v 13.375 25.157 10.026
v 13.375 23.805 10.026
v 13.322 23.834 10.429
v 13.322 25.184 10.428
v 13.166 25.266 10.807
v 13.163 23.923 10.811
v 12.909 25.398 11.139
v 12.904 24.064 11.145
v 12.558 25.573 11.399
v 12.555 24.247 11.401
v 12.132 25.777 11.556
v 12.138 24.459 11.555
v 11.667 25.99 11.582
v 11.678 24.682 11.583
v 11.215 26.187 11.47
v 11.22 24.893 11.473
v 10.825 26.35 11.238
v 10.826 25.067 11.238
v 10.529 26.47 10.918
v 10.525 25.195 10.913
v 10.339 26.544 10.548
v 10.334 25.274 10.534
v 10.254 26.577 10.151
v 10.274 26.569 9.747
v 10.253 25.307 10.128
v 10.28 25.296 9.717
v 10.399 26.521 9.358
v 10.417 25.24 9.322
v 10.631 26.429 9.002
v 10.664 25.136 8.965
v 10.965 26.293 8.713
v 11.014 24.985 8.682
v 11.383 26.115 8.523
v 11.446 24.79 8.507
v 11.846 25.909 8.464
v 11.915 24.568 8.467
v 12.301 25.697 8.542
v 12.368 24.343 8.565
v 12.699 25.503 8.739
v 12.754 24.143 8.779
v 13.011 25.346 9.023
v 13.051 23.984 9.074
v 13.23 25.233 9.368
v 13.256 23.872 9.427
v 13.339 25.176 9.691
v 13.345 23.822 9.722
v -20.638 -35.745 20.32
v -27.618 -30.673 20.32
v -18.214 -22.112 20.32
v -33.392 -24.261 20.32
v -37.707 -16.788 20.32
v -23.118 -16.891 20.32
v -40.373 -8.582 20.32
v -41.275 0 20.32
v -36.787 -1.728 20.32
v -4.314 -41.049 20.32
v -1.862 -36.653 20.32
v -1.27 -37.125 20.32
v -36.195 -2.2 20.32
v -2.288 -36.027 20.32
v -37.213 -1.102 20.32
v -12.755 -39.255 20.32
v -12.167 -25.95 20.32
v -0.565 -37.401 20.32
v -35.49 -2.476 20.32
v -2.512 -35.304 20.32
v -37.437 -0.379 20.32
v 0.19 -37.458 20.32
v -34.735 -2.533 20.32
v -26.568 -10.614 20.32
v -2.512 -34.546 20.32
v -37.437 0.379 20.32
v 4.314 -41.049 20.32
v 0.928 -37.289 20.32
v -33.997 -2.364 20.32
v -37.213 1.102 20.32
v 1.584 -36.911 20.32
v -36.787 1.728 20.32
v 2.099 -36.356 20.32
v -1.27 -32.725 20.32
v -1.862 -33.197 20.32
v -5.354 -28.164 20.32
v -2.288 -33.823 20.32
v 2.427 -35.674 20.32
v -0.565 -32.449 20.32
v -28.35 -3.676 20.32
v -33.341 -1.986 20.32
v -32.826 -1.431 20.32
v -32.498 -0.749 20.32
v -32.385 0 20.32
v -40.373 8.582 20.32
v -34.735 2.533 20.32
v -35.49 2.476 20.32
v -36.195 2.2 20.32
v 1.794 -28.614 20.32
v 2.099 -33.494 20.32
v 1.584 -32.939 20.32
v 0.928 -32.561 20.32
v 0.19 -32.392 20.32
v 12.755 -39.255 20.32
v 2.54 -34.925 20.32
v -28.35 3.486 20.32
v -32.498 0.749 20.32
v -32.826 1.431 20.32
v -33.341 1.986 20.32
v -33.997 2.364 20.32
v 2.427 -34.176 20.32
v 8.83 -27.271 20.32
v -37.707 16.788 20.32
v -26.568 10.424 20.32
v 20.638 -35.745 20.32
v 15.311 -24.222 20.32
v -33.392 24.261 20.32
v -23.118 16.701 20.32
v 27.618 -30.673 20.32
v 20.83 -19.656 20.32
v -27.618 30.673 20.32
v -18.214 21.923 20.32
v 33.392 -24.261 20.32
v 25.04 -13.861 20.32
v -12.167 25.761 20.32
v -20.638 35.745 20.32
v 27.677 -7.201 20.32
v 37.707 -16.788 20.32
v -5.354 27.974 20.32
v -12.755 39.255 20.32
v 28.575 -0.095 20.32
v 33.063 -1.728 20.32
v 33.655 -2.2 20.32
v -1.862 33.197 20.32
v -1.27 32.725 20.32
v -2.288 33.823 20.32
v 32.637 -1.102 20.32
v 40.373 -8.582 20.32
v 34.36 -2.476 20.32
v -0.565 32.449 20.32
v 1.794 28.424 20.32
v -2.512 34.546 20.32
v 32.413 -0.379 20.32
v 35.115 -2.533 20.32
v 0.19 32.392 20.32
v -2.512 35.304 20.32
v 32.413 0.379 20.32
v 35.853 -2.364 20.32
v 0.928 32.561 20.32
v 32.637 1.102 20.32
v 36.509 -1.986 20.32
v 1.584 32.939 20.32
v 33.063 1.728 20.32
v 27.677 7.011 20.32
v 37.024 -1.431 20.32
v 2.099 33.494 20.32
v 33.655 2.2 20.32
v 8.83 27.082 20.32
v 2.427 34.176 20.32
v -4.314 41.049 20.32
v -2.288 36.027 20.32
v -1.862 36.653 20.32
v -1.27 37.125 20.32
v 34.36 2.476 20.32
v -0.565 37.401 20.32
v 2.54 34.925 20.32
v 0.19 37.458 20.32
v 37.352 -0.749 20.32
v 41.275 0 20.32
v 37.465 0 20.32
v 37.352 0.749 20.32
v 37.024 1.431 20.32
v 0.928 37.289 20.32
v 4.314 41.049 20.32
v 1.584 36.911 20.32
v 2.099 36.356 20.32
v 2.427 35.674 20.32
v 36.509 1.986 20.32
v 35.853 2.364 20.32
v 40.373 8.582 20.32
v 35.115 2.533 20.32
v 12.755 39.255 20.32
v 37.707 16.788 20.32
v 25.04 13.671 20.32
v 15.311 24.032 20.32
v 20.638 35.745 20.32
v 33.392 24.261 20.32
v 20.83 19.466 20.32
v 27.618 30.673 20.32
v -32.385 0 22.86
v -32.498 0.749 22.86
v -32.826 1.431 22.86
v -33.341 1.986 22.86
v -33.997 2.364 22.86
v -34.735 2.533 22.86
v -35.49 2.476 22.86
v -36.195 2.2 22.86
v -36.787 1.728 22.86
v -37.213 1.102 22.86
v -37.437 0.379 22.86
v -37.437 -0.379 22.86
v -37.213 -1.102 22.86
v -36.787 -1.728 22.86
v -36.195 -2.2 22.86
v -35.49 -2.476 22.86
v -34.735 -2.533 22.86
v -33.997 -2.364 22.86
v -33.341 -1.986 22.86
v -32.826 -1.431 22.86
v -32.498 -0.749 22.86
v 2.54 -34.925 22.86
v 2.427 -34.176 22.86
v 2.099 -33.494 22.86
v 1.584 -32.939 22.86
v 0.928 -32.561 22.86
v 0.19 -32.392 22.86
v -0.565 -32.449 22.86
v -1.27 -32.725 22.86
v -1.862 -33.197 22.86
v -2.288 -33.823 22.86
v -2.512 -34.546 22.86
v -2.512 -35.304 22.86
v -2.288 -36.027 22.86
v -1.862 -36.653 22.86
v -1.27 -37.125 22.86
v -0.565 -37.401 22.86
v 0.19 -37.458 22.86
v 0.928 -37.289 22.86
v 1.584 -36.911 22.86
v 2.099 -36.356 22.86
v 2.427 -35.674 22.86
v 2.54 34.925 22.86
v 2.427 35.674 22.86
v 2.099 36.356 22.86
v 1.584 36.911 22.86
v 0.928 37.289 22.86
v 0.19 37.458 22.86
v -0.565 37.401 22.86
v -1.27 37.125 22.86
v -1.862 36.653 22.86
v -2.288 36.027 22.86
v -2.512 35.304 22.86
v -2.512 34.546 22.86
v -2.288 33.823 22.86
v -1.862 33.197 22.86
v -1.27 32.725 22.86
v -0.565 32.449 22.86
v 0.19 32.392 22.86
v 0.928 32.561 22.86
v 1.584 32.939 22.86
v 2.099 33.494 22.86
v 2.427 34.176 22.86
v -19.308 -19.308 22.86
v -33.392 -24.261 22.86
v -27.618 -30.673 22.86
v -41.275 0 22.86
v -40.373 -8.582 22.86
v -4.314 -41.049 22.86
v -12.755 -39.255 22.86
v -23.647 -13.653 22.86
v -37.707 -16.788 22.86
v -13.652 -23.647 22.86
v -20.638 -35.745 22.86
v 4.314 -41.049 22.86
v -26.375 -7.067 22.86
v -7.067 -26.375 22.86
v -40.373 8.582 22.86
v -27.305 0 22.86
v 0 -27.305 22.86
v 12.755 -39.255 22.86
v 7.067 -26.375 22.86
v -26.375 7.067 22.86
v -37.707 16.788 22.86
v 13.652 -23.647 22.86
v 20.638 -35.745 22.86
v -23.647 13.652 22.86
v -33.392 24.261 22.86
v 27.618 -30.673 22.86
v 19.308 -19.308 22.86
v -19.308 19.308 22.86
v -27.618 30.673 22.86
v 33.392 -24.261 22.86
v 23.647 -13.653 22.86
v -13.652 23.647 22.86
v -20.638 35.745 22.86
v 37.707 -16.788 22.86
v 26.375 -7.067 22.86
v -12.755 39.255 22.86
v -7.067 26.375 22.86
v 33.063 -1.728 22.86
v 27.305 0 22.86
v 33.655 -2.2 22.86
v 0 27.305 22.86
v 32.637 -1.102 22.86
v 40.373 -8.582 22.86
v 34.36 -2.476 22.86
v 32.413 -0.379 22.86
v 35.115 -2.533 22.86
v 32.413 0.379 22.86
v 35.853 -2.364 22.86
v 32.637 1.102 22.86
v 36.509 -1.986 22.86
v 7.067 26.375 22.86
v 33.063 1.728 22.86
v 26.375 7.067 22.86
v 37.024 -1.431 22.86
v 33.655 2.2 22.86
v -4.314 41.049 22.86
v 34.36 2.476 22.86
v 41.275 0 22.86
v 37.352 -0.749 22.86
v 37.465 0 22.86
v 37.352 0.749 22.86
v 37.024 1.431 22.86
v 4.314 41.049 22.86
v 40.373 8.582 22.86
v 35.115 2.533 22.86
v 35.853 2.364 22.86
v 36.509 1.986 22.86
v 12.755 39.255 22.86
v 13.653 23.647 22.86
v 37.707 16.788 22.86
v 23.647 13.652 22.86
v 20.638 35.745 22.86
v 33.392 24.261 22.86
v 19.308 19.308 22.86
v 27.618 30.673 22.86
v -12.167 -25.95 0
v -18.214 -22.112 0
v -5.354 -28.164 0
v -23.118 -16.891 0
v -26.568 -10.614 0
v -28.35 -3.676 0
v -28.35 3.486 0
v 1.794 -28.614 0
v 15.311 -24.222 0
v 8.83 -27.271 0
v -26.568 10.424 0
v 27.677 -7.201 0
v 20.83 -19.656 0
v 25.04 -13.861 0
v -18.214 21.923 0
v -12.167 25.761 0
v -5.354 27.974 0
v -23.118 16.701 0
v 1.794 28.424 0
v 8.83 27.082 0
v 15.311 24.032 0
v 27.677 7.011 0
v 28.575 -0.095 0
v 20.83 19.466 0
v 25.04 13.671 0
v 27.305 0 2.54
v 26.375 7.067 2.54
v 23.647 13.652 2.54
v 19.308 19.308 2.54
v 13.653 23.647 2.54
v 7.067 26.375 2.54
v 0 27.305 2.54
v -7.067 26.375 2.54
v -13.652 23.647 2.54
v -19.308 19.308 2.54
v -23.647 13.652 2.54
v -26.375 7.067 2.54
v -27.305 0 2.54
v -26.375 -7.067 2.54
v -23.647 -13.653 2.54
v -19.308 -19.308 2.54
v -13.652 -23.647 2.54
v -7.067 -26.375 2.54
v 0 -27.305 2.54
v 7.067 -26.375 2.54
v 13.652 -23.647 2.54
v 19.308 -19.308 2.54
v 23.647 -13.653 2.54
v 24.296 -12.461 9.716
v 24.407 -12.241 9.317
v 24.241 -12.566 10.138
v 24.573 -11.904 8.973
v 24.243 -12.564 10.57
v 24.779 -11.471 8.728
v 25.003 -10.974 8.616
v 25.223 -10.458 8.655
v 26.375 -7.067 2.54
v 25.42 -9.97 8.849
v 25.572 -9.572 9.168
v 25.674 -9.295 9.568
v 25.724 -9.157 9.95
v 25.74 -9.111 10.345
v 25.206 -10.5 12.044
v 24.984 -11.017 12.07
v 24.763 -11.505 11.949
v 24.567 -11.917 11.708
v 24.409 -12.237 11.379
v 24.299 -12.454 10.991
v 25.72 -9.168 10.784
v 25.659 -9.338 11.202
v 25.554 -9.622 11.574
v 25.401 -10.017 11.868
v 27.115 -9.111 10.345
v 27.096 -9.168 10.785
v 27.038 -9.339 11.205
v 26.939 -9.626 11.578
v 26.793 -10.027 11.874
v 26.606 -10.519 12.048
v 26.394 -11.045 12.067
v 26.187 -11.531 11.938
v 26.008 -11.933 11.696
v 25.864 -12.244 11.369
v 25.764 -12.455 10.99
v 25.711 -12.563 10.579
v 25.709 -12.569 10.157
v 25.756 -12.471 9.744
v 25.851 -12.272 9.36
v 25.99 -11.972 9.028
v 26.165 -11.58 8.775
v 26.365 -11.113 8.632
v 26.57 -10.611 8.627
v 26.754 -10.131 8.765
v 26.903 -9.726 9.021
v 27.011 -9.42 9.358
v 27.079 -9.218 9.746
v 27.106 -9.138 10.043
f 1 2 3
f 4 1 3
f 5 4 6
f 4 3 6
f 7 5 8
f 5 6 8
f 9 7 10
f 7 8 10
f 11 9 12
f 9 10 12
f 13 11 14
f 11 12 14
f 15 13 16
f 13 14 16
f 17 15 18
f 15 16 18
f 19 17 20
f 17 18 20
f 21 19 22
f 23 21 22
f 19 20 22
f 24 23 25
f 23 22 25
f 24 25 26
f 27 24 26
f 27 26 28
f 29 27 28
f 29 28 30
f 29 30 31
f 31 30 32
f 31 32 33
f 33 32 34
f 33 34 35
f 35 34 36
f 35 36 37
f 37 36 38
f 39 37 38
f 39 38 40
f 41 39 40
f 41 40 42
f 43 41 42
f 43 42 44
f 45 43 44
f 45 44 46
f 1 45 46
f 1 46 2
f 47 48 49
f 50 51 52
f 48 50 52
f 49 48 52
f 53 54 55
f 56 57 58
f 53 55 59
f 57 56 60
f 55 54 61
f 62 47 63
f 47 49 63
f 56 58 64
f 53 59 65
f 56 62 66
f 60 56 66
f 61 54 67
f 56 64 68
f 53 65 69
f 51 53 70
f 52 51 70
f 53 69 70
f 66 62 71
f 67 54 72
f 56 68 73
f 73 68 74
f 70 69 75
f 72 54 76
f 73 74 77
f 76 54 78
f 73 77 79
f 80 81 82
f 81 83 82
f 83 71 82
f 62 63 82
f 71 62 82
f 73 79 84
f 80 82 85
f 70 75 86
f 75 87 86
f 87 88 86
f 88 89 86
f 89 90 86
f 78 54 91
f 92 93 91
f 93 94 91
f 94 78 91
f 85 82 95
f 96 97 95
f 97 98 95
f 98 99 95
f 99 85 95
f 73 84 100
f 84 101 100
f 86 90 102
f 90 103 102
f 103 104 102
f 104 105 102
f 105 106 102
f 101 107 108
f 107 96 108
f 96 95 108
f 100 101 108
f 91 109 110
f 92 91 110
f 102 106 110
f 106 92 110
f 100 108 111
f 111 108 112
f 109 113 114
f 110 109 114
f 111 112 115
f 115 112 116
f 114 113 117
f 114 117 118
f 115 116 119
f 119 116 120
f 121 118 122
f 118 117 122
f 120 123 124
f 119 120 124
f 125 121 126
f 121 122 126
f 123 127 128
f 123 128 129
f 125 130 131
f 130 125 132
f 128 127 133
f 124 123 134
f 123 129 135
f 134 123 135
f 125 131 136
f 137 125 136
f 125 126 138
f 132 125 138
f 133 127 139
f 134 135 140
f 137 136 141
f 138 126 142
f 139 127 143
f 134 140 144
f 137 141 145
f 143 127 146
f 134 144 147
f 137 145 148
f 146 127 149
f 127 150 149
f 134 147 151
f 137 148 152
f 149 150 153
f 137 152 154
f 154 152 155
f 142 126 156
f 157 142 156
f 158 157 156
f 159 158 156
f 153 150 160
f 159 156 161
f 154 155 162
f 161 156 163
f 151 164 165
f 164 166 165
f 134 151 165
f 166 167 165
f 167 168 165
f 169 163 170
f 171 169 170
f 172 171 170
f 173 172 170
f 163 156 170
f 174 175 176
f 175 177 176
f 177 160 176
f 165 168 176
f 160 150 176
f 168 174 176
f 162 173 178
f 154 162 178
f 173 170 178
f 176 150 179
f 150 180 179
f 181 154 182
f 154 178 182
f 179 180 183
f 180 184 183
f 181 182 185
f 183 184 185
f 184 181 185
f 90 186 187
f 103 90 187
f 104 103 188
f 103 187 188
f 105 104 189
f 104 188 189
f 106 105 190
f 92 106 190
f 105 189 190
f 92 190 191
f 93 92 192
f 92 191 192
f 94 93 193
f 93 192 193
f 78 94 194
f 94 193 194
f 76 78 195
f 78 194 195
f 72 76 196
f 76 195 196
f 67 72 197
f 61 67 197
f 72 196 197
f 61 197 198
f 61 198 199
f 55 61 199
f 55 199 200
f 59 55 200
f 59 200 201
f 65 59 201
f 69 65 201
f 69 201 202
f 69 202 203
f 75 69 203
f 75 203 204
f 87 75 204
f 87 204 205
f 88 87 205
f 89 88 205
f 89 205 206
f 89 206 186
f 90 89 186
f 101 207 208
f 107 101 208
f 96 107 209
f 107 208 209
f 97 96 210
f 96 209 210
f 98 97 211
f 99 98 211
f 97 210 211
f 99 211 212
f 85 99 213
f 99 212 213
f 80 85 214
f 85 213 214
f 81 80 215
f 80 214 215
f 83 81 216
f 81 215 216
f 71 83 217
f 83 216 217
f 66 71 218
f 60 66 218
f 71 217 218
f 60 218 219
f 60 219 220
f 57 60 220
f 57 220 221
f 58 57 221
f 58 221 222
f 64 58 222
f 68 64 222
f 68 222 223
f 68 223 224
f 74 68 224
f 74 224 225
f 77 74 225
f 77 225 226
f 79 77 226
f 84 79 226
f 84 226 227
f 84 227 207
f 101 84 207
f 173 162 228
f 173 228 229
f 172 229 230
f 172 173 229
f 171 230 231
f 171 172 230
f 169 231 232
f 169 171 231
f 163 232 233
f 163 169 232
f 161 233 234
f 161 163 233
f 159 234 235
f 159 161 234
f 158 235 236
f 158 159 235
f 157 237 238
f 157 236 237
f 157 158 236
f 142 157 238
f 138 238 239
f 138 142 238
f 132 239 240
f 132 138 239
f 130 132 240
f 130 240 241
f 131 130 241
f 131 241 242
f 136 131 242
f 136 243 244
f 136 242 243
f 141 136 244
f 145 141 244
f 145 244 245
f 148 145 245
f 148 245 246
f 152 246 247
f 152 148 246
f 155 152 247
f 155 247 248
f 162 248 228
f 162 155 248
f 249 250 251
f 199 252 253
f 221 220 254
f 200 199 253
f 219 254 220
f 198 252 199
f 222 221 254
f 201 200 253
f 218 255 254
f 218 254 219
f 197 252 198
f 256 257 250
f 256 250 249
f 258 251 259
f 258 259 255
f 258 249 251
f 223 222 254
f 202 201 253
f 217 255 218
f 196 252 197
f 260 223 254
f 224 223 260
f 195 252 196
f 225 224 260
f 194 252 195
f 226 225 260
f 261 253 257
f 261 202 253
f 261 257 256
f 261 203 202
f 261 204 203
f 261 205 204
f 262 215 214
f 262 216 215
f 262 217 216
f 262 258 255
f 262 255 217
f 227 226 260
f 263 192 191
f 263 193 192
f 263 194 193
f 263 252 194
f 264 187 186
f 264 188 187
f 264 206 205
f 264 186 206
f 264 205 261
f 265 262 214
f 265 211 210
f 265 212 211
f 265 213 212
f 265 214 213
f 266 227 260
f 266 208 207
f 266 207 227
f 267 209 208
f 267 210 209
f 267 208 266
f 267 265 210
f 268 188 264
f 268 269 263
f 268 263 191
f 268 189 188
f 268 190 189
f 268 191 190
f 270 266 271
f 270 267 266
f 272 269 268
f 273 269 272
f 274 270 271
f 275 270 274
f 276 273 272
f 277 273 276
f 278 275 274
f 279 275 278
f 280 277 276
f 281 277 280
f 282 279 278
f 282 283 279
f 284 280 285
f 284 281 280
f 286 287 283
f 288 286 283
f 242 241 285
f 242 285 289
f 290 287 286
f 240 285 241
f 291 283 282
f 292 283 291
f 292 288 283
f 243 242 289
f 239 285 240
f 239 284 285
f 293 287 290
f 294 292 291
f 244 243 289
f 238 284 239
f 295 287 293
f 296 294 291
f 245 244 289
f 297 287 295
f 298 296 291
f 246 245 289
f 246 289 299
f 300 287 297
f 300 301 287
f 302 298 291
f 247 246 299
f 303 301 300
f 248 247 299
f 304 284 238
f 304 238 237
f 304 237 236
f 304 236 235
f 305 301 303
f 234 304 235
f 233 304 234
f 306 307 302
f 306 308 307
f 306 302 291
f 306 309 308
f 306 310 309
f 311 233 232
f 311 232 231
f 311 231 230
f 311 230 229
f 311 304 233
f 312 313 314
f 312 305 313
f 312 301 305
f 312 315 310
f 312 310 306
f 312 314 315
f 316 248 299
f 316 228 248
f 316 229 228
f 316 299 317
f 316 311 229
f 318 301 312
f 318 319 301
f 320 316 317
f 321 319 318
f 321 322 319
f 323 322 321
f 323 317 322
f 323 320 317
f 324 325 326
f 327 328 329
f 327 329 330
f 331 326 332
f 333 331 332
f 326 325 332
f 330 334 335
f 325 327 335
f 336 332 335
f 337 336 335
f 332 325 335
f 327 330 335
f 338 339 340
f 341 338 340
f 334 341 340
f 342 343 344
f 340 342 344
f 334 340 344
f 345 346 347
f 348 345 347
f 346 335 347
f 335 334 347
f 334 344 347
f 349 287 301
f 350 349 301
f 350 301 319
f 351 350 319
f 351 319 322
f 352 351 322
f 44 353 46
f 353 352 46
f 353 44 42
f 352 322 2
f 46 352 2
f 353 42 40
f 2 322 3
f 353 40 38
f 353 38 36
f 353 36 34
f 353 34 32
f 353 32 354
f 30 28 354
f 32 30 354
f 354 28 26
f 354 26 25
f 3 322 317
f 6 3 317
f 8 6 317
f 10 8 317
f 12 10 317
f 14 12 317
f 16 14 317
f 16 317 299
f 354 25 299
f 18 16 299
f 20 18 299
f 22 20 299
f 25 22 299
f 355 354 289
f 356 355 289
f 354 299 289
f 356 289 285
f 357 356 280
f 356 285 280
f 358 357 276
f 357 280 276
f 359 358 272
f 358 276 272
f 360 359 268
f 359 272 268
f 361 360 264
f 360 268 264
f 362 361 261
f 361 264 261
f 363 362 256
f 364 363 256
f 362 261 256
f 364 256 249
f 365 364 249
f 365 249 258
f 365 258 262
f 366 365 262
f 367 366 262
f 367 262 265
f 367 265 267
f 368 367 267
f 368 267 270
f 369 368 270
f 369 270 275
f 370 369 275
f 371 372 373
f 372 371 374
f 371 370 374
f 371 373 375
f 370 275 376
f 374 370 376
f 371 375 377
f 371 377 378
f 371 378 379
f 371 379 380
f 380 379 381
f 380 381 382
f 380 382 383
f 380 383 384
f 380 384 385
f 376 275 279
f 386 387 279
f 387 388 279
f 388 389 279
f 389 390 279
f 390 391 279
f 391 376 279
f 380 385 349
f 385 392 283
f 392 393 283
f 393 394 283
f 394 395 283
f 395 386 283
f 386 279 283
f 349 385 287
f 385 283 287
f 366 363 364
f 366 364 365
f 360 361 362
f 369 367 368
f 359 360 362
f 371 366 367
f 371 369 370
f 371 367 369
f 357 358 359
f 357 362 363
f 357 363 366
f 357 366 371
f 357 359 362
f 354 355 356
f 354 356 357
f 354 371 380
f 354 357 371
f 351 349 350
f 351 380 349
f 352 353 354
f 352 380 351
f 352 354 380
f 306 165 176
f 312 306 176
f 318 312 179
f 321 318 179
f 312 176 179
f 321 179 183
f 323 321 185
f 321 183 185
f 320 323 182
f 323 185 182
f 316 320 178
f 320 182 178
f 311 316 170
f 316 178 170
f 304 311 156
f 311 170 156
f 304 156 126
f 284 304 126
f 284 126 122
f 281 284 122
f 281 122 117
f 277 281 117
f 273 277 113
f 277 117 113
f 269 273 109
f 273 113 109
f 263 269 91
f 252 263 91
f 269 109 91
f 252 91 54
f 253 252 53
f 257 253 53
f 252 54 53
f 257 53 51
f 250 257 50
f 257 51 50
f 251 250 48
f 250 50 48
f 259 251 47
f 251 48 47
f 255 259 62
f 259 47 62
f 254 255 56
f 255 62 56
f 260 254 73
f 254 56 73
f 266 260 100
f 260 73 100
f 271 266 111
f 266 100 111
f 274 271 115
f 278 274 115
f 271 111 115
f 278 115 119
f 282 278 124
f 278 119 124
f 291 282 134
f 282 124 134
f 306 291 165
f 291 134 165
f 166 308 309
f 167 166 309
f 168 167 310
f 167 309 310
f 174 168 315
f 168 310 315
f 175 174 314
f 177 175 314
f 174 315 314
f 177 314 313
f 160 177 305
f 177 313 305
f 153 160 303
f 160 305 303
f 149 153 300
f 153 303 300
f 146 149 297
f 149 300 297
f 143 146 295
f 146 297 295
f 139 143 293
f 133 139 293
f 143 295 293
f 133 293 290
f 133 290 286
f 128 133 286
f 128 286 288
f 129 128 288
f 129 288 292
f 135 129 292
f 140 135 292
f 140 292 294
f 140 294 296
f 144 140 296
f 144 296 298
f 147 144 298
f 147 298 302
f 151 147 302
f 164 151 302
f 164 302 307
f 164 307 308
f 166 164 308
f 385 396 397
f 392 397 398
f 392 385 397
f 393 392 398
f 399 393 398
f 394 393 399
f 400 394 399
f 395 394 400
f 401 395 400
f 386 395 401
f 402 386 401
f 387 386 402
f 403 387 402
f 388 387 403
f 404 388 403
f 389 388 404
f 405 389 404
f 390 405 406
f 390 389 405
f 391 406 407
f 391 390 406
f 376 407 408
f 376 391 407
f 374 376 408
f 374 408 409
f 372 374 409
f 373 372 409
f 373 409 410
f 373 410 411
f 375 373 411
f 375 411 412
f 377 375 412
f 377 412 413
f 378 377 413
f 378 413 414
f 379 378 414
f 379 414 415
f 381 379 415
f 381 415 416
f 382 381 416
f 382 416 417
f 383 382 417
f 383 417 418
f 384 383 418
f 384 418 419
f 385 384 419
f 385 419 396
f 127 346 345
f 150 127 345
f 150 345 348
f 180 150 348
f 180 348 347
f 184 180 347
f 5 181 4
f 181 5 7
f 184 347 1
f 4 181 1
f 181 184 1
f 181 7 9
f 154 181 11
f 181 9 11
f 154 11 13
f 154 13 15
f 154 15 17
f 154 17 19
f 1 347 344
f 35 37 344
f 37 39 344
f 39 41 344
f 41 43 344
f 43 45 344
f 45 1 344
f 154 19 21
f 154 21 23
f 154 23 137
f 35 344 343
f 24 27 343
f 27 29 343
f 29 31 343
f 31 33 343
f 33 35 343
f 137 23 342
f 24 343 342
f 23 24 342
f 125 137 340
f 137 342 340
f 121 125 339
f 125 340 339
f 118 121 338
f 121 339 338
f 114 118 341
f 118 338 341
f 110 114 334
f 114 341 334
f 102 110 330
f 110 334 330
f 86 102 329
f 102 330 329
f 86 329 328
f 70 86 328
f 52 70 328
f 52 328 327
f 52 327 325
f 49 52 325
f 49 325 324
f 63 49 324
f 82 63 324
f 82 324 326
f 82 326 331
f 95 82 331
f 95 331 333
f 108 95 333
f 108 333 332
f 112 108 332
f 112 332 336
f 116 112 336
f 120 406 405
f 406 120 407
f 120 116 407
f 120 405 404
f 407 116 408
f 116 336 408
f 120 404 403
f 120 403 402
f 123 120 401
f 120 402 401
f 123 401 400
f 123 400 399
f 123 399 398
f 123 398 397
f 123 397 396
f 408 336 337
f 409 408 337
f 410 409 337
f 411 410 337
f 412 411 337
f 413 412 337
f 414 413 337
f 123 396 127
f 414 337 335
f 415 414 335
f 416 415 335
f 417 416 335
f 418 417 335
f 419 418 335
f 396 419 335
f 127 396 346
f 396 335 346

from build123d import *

# Parameters (mm, degrees)
F0_R      = 28.575
F1_DEPTH  = 20.32
F2_R      = 27.305
F3_DEPTH  = 17.78
F4_R      = 1.733709
F5_DEPTH  = 28.576
F6_R      = 1.562885
F7_DEPTH  = 28.481089
F8_R      = 41.275
F9_DEPTH  = 2.54
F10_R     = 27.305
F11_DEPTH = 2.54
F12_R     = 2.54
F13_DEPTH = 22.861
F14_R     = 2.54
F15_DEPTH = 22.861
F16_R     = 2.54
F17_DEPTH = 22.861
F18_R     = 2.54
F19_DEPTH = 22.861


with BuildPart() as f1:
    # F0 (on Top) → F1 (new body)
    with BuildSketch(Plane.XY):
        with Locations((0, -0.094911)):
            Circle(F0_R)
    extrude(amount=F1_DEPTH)

    # F2 (on face) → F3 (cut)
    with BuildSketch(Plane.XY.offset(20.32)):
        Circle(F2_R)
    extrude(amount=-F3_DEPTH, mode=Mode.SUBTRACT)

    # F4 (on Right) → F5 (cut, through all)
    with BuildSketch(Plane.YZ):
        with Locations((-10.845167, 10.345303)):
            Circle(F4_R)
    extrude(amount=F5_DEPTH, mode=Mode.SUBTRACT)

    # F6 (on Front) → F7 (cut, through all)
    with BuildSketch(Plane.XZ):
        with Locations((11.812109, 10.026056)):
            Circle(F6_R)
    extrude(amount=-F7_DEPTH, mode=Mode.SUBTRACT)

    # F8 (on face) → F9 (join)
    with BuildSketch(Plane.XY.offset(20.32)):
        Circle(F8_R)
    extrude(amount=F9_DEPTH)

    # F10 (on face) → F11 (cut)
    with BuildSketch(Plane.XY.offset(22.86)):
        Circle(F10_R)
    extrude(amount=-F11_DEPTH, mode=Mode.SUBTRACT)

    # F12 (on Top) → F13 (cut, through all)
    with BuildSketch(Plane.XY):
        with Locations((0, 34.925)):
            Circle(F12_R)
    extrude(amount=F13_DEPTH, mode=Mode.SUBTRACT)

    # F14 (on face) → F15 (cut, through all)
    with BuildSketch(Plane.XY.offset(22.86)):
        with Locations((-34.925, 0)):
            Circle(F14_R)
    extrude(amount=-F15_DEPTH, mode=Mode.SUBTRACT)

    # F16 (on face) → F17 (cut, through all)
    with BuildSketch(Plane.XY.offset(22.86)):
        with Locations((0, -34.925)):
            Circle(F16_R)
    extrude(amount=-F17_DEPTH, mode=Mode.SUBTRACT)

    # F18 (on face) → F19 (cut, through all)
    with BuildSketch(Plane.XY.offset(22.86)):
        with Locations((34.925, 0)):
            Circle(F18_R)
    extrude(amount=-F19_DEPTH, mode=Mode.SUBTRACT)


solid = f1.part
